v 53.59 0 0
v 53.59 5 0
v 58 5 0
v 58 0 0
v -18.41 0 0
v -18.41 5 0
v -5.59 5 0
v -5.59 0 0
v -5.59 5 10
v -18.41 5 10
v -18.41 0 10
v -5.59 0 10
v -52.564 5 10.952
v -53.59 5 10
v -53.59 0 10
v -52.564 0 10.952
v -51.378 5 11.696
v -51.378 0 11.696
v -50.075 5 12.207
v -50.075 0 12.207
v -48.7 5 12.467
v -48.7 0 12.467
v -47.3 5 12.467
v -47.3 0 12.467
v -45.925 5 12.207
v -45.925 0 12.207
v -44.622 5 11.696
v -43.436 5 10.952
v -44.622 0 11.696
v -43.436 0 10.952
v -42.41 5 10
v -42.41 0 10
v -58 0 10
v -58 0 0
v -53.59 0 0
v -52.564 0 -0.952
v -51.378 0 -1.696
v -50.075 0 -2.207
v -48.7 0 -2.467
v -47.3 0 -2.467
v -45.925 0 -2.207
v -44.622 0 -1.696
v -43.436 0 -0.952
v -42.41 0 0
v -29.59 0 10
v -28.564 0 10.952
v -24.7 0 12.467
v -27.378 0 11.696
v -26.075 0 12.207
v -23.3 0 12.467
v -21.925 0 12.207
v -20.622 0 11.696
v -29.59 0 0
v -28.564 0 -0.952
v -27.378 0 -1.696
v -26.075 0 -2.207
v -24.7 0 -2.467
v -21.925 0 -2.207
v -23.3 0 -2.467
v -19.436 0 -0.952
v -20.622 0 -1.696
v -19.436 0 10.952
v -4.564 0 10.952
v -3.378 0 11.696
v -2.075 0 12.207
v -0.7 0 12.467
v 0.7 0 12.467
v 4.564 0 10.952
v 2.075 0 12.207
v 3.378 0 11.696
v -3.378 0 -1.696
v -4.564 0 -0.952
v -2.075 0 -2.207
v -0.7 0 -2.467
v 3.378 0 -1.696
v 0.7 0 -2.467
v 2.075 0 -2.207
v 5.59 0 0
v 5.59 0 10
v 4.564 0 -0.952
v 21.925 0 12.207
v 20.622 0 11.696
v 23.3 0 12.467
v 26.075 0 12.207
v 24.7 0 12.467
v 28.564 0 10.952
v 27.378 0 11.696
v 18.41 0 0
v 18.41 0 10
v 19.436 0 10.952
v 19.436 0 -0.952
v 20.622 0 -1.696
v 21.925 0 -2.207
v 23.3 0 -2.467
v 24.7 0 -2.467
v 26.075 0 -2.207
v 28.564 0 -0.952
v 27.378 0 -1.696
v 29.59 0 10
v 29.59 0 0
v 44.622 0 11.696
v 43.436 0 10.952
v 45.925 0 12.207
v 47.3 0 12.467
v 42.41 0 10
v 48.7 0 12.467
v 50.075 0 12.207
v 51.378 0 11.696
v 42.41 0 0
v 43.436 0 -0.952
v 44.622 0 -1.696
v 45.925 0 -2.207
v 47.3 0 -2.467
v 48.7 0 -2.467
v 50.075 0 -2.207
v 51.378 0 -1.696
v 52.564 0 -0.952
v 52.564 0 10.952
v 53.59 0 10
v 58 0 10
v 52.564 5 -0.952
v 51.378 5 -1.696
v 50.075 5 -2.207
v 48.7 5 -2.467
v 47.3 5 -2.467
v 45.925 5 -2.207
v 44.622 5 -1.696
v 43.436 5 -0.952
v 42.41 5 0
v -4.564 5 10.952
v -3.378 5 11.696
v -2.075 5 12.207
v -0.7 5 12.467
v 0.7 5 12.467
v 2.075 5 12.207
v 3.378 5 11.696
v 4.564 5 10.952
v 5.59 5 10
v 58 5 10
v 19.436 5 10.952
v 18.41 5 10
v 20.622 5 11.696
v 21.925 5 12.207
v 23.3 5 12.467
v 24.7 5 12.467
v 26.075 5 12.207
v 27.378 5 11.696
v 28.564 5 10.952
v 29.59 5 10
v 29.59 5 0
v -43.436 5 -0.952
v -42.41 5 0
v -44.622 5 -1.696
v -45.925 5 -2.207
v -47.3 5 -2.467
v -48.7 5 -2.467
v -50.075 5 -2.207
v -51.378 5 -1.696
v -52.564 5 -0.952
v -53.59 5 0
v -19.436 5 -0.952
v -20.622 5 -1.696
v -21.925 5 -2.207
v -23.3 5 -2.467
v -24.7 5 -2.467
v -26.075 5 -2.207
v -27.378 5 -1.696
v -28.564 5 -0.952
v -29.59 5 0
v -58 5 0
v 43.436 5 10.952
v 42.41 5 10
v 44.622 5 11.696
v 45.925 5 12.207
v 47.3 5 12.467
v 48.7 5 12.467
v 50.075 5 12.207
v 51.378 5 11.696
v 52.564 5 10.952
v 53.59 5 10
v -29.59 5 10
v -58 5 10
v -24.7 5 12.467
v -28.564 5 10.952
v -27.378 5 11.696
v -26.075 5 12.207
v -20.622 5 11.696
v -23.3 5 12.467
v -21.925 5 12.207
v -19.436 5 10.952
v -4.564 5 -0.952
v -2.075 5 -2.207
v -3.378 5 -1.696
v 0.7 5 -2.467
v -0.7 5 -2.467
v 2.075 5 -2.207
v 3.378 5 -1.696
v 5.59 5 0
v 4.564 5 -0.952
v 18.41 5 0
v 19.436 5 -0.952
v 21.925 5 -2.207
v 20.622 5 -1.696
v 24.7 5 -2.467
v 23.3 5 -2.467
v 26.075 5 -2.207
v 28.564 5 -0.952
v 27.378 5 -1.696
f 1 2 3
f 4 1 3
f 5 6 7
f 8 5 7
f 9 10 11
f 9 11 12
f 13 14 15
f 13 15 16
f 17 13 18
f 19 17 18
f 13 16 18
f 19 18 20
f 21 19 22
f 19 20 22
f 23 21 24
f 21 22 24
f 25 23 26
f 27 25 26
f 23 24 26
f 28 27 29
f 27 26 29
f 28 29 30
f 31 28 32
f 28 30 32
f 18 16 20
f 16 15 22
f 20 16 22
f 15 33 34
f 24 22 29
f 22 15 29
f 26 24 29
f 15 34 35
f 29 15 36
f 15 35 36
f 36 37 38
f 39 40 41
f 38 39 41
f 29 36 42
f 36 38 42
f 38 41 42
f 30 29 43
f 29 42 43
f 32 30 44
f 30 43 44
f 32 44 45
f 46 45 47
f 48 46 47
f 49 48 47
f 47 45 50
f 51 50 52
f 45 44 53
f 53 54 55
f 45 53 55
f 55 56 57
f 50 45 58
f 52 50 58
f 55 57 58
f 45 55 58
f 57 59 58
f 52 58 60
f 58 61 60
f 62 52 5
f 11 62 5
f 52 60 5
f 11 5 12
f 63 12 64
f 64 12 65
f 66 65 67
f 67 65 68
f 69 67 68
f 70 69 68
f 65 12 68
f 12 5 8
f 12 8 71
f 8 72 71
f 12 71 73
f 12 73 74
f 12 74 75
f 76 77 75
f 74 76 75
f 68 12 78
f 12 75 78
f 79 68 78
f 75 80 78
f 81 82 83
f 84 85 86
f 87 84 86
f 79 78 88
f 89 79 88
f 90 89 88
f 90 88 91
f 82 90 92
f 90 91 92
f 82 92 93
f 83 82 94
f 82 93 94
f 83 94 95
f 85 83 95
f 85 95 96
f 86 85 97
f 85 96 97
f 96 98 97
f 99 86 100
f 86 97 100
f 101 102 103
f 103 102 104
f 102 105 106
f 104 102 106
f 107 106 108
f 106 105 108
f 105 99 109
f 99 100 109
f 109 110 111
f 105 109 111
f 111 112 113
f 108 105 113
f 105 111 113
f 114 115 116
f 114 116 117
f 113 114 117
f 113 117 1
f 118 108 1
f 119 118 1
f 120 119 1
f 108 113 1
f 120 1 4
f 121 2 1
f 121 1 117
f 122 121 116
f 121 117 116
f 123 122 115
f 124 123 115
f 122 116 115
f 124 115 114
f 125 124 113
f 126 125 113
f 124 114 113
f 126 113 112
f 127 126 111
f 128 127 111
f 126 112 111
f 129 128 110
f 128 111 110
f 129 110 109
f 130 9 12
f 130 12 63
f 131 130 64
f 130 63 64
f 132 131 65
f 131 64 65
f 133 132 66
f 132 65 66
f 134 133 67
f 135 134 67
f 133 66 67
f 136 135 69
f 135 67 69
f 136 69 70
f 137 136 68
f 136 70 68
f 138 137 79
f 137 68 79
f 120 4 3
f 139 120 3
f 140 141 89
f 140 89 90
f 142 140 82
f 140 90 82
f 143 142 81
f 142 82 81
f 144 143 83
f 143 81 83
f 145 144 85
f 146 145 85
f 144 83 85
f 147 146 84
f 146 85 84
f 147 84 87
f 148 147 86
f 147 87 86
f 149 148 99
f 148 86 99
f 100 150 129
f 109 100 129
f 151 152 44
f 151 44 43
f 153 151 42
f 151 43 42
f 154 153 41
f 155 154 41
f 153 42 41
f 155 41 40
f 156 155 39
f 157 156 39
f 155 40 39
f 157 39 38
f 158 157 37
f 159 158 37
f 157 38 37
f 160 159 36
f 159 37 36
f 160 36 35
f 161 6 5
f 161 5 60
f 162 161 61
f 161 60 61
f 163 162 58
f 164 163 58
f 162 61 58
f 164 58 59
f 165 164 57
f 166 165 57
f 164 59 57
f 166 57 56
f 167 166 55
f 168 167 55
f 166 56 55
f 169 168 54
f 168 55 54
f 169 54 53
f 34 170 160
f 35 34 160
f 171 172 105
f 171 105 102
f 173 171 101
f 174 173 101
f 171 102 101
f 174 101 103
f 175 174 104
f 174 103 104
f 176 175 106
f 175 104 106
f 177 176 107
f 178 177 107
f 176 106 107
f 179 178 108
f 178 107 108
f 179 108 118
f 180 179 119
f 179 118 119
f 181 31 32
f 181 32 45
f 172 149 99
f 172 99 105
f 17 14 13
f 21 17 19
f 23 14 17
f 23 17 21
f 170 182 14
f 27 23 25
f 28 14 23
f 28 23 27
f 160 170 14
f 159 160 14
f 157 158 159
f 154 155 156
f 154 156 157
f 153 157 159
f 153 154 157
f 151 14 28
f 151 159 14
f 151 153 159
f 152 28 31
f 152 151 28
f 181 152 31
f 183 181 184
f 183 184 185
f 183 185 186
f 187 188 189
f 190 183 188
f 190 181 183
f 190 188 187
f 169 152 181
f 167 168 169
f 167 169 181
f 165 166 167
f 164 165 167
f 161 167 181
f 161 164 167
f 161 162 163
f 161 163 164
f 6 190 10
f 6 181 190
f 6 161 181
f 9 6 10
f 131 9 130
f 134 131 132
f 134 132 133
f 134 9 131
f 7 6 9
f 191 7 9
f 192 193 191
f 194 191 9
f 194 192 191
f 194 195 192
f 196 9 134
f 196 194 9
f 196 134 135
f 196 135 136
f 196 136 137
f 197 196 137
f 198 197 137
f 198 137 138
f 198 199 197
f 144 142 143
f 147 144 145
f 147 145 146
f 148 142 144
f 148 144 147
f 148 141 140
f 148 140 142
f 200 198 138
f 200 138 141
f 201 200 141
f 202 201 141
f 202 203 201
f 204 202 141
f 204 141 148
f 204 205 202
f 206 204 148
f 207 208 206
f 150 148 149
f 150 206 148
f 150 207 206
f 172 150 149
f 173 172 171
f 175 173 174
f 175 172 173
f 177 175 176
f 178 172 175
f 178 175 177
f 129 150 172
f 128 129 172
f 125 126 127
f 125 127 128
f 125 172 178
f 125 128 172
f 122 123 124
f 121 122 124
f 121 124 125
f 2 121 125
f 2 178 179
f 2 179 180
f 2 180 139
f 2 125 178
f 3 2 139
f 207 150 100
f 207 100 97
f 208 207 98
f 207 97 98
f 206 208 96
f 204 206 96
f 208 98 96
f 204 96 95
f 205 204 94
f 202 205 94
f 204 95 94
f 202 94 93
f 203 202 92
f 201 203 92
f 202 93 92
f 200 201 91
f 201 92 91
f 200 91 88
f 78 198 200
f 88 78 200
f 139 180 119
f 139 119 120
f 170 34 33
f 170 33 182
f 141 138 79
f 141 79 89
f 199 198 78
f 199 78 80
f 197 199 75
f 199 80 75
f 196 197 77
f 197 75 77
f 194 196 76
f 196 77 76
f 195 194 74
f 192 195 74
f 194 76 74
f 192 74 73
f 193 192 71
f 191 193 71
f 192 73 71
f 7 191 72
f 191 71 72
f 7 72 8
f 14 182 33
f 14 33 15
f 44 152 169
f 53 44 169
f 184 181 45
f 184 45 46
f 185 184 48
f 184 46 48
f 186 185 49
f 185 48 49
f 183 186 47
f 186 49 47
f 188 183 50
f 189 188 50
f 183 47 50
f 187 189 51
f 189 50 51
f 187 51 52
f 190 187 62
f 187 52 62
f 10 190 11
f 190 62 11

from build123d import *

# Parameters (mm, degrees)
ESQUISSE1_W        = 116
ESQUISSE1_H        = 5
BOSS_EXTRU_1_DEPTH = 10
ESQUISSE3_R        = 7.5
BOSS_EXTRU_3_DEPTH = 5


with BuildPart() as part:
    # Esquisse1 → Boss.-Extru.1 (new body)
    with BuildSketch(Plane.XY):
        with Locations((0, 2.5)):
            Rectangle(ESQUISSE1_W, ESQUISSE1_H)
    extrude(amount=BOSS_EXTRU_1_DEPTH)

    # Esquisse3 → Boss.-Extru.3 (add)
    with BuildSketch(Plane(origin=(0, 0, 0), x_dir=(1, 0, 0), z_dir=(0, 1, 0))):
        with Locations((-48, -5)):
            Circle(ESQUISSE3_R)
        with Locations((-24, -5)):
            Circle(ESQUISSE3_R)
        with Locations((0, -5)):
            Circle(ESQUISSE3_R)
        with Locations((24, -5)):
            Circle(ESQUISSE3_R)
        with Locations((48, -5)):
            Circle(ESQUISSE3_R)
    extrude(amount=BOSS_EXTRU_3_DEPTH)


solid = part.part
